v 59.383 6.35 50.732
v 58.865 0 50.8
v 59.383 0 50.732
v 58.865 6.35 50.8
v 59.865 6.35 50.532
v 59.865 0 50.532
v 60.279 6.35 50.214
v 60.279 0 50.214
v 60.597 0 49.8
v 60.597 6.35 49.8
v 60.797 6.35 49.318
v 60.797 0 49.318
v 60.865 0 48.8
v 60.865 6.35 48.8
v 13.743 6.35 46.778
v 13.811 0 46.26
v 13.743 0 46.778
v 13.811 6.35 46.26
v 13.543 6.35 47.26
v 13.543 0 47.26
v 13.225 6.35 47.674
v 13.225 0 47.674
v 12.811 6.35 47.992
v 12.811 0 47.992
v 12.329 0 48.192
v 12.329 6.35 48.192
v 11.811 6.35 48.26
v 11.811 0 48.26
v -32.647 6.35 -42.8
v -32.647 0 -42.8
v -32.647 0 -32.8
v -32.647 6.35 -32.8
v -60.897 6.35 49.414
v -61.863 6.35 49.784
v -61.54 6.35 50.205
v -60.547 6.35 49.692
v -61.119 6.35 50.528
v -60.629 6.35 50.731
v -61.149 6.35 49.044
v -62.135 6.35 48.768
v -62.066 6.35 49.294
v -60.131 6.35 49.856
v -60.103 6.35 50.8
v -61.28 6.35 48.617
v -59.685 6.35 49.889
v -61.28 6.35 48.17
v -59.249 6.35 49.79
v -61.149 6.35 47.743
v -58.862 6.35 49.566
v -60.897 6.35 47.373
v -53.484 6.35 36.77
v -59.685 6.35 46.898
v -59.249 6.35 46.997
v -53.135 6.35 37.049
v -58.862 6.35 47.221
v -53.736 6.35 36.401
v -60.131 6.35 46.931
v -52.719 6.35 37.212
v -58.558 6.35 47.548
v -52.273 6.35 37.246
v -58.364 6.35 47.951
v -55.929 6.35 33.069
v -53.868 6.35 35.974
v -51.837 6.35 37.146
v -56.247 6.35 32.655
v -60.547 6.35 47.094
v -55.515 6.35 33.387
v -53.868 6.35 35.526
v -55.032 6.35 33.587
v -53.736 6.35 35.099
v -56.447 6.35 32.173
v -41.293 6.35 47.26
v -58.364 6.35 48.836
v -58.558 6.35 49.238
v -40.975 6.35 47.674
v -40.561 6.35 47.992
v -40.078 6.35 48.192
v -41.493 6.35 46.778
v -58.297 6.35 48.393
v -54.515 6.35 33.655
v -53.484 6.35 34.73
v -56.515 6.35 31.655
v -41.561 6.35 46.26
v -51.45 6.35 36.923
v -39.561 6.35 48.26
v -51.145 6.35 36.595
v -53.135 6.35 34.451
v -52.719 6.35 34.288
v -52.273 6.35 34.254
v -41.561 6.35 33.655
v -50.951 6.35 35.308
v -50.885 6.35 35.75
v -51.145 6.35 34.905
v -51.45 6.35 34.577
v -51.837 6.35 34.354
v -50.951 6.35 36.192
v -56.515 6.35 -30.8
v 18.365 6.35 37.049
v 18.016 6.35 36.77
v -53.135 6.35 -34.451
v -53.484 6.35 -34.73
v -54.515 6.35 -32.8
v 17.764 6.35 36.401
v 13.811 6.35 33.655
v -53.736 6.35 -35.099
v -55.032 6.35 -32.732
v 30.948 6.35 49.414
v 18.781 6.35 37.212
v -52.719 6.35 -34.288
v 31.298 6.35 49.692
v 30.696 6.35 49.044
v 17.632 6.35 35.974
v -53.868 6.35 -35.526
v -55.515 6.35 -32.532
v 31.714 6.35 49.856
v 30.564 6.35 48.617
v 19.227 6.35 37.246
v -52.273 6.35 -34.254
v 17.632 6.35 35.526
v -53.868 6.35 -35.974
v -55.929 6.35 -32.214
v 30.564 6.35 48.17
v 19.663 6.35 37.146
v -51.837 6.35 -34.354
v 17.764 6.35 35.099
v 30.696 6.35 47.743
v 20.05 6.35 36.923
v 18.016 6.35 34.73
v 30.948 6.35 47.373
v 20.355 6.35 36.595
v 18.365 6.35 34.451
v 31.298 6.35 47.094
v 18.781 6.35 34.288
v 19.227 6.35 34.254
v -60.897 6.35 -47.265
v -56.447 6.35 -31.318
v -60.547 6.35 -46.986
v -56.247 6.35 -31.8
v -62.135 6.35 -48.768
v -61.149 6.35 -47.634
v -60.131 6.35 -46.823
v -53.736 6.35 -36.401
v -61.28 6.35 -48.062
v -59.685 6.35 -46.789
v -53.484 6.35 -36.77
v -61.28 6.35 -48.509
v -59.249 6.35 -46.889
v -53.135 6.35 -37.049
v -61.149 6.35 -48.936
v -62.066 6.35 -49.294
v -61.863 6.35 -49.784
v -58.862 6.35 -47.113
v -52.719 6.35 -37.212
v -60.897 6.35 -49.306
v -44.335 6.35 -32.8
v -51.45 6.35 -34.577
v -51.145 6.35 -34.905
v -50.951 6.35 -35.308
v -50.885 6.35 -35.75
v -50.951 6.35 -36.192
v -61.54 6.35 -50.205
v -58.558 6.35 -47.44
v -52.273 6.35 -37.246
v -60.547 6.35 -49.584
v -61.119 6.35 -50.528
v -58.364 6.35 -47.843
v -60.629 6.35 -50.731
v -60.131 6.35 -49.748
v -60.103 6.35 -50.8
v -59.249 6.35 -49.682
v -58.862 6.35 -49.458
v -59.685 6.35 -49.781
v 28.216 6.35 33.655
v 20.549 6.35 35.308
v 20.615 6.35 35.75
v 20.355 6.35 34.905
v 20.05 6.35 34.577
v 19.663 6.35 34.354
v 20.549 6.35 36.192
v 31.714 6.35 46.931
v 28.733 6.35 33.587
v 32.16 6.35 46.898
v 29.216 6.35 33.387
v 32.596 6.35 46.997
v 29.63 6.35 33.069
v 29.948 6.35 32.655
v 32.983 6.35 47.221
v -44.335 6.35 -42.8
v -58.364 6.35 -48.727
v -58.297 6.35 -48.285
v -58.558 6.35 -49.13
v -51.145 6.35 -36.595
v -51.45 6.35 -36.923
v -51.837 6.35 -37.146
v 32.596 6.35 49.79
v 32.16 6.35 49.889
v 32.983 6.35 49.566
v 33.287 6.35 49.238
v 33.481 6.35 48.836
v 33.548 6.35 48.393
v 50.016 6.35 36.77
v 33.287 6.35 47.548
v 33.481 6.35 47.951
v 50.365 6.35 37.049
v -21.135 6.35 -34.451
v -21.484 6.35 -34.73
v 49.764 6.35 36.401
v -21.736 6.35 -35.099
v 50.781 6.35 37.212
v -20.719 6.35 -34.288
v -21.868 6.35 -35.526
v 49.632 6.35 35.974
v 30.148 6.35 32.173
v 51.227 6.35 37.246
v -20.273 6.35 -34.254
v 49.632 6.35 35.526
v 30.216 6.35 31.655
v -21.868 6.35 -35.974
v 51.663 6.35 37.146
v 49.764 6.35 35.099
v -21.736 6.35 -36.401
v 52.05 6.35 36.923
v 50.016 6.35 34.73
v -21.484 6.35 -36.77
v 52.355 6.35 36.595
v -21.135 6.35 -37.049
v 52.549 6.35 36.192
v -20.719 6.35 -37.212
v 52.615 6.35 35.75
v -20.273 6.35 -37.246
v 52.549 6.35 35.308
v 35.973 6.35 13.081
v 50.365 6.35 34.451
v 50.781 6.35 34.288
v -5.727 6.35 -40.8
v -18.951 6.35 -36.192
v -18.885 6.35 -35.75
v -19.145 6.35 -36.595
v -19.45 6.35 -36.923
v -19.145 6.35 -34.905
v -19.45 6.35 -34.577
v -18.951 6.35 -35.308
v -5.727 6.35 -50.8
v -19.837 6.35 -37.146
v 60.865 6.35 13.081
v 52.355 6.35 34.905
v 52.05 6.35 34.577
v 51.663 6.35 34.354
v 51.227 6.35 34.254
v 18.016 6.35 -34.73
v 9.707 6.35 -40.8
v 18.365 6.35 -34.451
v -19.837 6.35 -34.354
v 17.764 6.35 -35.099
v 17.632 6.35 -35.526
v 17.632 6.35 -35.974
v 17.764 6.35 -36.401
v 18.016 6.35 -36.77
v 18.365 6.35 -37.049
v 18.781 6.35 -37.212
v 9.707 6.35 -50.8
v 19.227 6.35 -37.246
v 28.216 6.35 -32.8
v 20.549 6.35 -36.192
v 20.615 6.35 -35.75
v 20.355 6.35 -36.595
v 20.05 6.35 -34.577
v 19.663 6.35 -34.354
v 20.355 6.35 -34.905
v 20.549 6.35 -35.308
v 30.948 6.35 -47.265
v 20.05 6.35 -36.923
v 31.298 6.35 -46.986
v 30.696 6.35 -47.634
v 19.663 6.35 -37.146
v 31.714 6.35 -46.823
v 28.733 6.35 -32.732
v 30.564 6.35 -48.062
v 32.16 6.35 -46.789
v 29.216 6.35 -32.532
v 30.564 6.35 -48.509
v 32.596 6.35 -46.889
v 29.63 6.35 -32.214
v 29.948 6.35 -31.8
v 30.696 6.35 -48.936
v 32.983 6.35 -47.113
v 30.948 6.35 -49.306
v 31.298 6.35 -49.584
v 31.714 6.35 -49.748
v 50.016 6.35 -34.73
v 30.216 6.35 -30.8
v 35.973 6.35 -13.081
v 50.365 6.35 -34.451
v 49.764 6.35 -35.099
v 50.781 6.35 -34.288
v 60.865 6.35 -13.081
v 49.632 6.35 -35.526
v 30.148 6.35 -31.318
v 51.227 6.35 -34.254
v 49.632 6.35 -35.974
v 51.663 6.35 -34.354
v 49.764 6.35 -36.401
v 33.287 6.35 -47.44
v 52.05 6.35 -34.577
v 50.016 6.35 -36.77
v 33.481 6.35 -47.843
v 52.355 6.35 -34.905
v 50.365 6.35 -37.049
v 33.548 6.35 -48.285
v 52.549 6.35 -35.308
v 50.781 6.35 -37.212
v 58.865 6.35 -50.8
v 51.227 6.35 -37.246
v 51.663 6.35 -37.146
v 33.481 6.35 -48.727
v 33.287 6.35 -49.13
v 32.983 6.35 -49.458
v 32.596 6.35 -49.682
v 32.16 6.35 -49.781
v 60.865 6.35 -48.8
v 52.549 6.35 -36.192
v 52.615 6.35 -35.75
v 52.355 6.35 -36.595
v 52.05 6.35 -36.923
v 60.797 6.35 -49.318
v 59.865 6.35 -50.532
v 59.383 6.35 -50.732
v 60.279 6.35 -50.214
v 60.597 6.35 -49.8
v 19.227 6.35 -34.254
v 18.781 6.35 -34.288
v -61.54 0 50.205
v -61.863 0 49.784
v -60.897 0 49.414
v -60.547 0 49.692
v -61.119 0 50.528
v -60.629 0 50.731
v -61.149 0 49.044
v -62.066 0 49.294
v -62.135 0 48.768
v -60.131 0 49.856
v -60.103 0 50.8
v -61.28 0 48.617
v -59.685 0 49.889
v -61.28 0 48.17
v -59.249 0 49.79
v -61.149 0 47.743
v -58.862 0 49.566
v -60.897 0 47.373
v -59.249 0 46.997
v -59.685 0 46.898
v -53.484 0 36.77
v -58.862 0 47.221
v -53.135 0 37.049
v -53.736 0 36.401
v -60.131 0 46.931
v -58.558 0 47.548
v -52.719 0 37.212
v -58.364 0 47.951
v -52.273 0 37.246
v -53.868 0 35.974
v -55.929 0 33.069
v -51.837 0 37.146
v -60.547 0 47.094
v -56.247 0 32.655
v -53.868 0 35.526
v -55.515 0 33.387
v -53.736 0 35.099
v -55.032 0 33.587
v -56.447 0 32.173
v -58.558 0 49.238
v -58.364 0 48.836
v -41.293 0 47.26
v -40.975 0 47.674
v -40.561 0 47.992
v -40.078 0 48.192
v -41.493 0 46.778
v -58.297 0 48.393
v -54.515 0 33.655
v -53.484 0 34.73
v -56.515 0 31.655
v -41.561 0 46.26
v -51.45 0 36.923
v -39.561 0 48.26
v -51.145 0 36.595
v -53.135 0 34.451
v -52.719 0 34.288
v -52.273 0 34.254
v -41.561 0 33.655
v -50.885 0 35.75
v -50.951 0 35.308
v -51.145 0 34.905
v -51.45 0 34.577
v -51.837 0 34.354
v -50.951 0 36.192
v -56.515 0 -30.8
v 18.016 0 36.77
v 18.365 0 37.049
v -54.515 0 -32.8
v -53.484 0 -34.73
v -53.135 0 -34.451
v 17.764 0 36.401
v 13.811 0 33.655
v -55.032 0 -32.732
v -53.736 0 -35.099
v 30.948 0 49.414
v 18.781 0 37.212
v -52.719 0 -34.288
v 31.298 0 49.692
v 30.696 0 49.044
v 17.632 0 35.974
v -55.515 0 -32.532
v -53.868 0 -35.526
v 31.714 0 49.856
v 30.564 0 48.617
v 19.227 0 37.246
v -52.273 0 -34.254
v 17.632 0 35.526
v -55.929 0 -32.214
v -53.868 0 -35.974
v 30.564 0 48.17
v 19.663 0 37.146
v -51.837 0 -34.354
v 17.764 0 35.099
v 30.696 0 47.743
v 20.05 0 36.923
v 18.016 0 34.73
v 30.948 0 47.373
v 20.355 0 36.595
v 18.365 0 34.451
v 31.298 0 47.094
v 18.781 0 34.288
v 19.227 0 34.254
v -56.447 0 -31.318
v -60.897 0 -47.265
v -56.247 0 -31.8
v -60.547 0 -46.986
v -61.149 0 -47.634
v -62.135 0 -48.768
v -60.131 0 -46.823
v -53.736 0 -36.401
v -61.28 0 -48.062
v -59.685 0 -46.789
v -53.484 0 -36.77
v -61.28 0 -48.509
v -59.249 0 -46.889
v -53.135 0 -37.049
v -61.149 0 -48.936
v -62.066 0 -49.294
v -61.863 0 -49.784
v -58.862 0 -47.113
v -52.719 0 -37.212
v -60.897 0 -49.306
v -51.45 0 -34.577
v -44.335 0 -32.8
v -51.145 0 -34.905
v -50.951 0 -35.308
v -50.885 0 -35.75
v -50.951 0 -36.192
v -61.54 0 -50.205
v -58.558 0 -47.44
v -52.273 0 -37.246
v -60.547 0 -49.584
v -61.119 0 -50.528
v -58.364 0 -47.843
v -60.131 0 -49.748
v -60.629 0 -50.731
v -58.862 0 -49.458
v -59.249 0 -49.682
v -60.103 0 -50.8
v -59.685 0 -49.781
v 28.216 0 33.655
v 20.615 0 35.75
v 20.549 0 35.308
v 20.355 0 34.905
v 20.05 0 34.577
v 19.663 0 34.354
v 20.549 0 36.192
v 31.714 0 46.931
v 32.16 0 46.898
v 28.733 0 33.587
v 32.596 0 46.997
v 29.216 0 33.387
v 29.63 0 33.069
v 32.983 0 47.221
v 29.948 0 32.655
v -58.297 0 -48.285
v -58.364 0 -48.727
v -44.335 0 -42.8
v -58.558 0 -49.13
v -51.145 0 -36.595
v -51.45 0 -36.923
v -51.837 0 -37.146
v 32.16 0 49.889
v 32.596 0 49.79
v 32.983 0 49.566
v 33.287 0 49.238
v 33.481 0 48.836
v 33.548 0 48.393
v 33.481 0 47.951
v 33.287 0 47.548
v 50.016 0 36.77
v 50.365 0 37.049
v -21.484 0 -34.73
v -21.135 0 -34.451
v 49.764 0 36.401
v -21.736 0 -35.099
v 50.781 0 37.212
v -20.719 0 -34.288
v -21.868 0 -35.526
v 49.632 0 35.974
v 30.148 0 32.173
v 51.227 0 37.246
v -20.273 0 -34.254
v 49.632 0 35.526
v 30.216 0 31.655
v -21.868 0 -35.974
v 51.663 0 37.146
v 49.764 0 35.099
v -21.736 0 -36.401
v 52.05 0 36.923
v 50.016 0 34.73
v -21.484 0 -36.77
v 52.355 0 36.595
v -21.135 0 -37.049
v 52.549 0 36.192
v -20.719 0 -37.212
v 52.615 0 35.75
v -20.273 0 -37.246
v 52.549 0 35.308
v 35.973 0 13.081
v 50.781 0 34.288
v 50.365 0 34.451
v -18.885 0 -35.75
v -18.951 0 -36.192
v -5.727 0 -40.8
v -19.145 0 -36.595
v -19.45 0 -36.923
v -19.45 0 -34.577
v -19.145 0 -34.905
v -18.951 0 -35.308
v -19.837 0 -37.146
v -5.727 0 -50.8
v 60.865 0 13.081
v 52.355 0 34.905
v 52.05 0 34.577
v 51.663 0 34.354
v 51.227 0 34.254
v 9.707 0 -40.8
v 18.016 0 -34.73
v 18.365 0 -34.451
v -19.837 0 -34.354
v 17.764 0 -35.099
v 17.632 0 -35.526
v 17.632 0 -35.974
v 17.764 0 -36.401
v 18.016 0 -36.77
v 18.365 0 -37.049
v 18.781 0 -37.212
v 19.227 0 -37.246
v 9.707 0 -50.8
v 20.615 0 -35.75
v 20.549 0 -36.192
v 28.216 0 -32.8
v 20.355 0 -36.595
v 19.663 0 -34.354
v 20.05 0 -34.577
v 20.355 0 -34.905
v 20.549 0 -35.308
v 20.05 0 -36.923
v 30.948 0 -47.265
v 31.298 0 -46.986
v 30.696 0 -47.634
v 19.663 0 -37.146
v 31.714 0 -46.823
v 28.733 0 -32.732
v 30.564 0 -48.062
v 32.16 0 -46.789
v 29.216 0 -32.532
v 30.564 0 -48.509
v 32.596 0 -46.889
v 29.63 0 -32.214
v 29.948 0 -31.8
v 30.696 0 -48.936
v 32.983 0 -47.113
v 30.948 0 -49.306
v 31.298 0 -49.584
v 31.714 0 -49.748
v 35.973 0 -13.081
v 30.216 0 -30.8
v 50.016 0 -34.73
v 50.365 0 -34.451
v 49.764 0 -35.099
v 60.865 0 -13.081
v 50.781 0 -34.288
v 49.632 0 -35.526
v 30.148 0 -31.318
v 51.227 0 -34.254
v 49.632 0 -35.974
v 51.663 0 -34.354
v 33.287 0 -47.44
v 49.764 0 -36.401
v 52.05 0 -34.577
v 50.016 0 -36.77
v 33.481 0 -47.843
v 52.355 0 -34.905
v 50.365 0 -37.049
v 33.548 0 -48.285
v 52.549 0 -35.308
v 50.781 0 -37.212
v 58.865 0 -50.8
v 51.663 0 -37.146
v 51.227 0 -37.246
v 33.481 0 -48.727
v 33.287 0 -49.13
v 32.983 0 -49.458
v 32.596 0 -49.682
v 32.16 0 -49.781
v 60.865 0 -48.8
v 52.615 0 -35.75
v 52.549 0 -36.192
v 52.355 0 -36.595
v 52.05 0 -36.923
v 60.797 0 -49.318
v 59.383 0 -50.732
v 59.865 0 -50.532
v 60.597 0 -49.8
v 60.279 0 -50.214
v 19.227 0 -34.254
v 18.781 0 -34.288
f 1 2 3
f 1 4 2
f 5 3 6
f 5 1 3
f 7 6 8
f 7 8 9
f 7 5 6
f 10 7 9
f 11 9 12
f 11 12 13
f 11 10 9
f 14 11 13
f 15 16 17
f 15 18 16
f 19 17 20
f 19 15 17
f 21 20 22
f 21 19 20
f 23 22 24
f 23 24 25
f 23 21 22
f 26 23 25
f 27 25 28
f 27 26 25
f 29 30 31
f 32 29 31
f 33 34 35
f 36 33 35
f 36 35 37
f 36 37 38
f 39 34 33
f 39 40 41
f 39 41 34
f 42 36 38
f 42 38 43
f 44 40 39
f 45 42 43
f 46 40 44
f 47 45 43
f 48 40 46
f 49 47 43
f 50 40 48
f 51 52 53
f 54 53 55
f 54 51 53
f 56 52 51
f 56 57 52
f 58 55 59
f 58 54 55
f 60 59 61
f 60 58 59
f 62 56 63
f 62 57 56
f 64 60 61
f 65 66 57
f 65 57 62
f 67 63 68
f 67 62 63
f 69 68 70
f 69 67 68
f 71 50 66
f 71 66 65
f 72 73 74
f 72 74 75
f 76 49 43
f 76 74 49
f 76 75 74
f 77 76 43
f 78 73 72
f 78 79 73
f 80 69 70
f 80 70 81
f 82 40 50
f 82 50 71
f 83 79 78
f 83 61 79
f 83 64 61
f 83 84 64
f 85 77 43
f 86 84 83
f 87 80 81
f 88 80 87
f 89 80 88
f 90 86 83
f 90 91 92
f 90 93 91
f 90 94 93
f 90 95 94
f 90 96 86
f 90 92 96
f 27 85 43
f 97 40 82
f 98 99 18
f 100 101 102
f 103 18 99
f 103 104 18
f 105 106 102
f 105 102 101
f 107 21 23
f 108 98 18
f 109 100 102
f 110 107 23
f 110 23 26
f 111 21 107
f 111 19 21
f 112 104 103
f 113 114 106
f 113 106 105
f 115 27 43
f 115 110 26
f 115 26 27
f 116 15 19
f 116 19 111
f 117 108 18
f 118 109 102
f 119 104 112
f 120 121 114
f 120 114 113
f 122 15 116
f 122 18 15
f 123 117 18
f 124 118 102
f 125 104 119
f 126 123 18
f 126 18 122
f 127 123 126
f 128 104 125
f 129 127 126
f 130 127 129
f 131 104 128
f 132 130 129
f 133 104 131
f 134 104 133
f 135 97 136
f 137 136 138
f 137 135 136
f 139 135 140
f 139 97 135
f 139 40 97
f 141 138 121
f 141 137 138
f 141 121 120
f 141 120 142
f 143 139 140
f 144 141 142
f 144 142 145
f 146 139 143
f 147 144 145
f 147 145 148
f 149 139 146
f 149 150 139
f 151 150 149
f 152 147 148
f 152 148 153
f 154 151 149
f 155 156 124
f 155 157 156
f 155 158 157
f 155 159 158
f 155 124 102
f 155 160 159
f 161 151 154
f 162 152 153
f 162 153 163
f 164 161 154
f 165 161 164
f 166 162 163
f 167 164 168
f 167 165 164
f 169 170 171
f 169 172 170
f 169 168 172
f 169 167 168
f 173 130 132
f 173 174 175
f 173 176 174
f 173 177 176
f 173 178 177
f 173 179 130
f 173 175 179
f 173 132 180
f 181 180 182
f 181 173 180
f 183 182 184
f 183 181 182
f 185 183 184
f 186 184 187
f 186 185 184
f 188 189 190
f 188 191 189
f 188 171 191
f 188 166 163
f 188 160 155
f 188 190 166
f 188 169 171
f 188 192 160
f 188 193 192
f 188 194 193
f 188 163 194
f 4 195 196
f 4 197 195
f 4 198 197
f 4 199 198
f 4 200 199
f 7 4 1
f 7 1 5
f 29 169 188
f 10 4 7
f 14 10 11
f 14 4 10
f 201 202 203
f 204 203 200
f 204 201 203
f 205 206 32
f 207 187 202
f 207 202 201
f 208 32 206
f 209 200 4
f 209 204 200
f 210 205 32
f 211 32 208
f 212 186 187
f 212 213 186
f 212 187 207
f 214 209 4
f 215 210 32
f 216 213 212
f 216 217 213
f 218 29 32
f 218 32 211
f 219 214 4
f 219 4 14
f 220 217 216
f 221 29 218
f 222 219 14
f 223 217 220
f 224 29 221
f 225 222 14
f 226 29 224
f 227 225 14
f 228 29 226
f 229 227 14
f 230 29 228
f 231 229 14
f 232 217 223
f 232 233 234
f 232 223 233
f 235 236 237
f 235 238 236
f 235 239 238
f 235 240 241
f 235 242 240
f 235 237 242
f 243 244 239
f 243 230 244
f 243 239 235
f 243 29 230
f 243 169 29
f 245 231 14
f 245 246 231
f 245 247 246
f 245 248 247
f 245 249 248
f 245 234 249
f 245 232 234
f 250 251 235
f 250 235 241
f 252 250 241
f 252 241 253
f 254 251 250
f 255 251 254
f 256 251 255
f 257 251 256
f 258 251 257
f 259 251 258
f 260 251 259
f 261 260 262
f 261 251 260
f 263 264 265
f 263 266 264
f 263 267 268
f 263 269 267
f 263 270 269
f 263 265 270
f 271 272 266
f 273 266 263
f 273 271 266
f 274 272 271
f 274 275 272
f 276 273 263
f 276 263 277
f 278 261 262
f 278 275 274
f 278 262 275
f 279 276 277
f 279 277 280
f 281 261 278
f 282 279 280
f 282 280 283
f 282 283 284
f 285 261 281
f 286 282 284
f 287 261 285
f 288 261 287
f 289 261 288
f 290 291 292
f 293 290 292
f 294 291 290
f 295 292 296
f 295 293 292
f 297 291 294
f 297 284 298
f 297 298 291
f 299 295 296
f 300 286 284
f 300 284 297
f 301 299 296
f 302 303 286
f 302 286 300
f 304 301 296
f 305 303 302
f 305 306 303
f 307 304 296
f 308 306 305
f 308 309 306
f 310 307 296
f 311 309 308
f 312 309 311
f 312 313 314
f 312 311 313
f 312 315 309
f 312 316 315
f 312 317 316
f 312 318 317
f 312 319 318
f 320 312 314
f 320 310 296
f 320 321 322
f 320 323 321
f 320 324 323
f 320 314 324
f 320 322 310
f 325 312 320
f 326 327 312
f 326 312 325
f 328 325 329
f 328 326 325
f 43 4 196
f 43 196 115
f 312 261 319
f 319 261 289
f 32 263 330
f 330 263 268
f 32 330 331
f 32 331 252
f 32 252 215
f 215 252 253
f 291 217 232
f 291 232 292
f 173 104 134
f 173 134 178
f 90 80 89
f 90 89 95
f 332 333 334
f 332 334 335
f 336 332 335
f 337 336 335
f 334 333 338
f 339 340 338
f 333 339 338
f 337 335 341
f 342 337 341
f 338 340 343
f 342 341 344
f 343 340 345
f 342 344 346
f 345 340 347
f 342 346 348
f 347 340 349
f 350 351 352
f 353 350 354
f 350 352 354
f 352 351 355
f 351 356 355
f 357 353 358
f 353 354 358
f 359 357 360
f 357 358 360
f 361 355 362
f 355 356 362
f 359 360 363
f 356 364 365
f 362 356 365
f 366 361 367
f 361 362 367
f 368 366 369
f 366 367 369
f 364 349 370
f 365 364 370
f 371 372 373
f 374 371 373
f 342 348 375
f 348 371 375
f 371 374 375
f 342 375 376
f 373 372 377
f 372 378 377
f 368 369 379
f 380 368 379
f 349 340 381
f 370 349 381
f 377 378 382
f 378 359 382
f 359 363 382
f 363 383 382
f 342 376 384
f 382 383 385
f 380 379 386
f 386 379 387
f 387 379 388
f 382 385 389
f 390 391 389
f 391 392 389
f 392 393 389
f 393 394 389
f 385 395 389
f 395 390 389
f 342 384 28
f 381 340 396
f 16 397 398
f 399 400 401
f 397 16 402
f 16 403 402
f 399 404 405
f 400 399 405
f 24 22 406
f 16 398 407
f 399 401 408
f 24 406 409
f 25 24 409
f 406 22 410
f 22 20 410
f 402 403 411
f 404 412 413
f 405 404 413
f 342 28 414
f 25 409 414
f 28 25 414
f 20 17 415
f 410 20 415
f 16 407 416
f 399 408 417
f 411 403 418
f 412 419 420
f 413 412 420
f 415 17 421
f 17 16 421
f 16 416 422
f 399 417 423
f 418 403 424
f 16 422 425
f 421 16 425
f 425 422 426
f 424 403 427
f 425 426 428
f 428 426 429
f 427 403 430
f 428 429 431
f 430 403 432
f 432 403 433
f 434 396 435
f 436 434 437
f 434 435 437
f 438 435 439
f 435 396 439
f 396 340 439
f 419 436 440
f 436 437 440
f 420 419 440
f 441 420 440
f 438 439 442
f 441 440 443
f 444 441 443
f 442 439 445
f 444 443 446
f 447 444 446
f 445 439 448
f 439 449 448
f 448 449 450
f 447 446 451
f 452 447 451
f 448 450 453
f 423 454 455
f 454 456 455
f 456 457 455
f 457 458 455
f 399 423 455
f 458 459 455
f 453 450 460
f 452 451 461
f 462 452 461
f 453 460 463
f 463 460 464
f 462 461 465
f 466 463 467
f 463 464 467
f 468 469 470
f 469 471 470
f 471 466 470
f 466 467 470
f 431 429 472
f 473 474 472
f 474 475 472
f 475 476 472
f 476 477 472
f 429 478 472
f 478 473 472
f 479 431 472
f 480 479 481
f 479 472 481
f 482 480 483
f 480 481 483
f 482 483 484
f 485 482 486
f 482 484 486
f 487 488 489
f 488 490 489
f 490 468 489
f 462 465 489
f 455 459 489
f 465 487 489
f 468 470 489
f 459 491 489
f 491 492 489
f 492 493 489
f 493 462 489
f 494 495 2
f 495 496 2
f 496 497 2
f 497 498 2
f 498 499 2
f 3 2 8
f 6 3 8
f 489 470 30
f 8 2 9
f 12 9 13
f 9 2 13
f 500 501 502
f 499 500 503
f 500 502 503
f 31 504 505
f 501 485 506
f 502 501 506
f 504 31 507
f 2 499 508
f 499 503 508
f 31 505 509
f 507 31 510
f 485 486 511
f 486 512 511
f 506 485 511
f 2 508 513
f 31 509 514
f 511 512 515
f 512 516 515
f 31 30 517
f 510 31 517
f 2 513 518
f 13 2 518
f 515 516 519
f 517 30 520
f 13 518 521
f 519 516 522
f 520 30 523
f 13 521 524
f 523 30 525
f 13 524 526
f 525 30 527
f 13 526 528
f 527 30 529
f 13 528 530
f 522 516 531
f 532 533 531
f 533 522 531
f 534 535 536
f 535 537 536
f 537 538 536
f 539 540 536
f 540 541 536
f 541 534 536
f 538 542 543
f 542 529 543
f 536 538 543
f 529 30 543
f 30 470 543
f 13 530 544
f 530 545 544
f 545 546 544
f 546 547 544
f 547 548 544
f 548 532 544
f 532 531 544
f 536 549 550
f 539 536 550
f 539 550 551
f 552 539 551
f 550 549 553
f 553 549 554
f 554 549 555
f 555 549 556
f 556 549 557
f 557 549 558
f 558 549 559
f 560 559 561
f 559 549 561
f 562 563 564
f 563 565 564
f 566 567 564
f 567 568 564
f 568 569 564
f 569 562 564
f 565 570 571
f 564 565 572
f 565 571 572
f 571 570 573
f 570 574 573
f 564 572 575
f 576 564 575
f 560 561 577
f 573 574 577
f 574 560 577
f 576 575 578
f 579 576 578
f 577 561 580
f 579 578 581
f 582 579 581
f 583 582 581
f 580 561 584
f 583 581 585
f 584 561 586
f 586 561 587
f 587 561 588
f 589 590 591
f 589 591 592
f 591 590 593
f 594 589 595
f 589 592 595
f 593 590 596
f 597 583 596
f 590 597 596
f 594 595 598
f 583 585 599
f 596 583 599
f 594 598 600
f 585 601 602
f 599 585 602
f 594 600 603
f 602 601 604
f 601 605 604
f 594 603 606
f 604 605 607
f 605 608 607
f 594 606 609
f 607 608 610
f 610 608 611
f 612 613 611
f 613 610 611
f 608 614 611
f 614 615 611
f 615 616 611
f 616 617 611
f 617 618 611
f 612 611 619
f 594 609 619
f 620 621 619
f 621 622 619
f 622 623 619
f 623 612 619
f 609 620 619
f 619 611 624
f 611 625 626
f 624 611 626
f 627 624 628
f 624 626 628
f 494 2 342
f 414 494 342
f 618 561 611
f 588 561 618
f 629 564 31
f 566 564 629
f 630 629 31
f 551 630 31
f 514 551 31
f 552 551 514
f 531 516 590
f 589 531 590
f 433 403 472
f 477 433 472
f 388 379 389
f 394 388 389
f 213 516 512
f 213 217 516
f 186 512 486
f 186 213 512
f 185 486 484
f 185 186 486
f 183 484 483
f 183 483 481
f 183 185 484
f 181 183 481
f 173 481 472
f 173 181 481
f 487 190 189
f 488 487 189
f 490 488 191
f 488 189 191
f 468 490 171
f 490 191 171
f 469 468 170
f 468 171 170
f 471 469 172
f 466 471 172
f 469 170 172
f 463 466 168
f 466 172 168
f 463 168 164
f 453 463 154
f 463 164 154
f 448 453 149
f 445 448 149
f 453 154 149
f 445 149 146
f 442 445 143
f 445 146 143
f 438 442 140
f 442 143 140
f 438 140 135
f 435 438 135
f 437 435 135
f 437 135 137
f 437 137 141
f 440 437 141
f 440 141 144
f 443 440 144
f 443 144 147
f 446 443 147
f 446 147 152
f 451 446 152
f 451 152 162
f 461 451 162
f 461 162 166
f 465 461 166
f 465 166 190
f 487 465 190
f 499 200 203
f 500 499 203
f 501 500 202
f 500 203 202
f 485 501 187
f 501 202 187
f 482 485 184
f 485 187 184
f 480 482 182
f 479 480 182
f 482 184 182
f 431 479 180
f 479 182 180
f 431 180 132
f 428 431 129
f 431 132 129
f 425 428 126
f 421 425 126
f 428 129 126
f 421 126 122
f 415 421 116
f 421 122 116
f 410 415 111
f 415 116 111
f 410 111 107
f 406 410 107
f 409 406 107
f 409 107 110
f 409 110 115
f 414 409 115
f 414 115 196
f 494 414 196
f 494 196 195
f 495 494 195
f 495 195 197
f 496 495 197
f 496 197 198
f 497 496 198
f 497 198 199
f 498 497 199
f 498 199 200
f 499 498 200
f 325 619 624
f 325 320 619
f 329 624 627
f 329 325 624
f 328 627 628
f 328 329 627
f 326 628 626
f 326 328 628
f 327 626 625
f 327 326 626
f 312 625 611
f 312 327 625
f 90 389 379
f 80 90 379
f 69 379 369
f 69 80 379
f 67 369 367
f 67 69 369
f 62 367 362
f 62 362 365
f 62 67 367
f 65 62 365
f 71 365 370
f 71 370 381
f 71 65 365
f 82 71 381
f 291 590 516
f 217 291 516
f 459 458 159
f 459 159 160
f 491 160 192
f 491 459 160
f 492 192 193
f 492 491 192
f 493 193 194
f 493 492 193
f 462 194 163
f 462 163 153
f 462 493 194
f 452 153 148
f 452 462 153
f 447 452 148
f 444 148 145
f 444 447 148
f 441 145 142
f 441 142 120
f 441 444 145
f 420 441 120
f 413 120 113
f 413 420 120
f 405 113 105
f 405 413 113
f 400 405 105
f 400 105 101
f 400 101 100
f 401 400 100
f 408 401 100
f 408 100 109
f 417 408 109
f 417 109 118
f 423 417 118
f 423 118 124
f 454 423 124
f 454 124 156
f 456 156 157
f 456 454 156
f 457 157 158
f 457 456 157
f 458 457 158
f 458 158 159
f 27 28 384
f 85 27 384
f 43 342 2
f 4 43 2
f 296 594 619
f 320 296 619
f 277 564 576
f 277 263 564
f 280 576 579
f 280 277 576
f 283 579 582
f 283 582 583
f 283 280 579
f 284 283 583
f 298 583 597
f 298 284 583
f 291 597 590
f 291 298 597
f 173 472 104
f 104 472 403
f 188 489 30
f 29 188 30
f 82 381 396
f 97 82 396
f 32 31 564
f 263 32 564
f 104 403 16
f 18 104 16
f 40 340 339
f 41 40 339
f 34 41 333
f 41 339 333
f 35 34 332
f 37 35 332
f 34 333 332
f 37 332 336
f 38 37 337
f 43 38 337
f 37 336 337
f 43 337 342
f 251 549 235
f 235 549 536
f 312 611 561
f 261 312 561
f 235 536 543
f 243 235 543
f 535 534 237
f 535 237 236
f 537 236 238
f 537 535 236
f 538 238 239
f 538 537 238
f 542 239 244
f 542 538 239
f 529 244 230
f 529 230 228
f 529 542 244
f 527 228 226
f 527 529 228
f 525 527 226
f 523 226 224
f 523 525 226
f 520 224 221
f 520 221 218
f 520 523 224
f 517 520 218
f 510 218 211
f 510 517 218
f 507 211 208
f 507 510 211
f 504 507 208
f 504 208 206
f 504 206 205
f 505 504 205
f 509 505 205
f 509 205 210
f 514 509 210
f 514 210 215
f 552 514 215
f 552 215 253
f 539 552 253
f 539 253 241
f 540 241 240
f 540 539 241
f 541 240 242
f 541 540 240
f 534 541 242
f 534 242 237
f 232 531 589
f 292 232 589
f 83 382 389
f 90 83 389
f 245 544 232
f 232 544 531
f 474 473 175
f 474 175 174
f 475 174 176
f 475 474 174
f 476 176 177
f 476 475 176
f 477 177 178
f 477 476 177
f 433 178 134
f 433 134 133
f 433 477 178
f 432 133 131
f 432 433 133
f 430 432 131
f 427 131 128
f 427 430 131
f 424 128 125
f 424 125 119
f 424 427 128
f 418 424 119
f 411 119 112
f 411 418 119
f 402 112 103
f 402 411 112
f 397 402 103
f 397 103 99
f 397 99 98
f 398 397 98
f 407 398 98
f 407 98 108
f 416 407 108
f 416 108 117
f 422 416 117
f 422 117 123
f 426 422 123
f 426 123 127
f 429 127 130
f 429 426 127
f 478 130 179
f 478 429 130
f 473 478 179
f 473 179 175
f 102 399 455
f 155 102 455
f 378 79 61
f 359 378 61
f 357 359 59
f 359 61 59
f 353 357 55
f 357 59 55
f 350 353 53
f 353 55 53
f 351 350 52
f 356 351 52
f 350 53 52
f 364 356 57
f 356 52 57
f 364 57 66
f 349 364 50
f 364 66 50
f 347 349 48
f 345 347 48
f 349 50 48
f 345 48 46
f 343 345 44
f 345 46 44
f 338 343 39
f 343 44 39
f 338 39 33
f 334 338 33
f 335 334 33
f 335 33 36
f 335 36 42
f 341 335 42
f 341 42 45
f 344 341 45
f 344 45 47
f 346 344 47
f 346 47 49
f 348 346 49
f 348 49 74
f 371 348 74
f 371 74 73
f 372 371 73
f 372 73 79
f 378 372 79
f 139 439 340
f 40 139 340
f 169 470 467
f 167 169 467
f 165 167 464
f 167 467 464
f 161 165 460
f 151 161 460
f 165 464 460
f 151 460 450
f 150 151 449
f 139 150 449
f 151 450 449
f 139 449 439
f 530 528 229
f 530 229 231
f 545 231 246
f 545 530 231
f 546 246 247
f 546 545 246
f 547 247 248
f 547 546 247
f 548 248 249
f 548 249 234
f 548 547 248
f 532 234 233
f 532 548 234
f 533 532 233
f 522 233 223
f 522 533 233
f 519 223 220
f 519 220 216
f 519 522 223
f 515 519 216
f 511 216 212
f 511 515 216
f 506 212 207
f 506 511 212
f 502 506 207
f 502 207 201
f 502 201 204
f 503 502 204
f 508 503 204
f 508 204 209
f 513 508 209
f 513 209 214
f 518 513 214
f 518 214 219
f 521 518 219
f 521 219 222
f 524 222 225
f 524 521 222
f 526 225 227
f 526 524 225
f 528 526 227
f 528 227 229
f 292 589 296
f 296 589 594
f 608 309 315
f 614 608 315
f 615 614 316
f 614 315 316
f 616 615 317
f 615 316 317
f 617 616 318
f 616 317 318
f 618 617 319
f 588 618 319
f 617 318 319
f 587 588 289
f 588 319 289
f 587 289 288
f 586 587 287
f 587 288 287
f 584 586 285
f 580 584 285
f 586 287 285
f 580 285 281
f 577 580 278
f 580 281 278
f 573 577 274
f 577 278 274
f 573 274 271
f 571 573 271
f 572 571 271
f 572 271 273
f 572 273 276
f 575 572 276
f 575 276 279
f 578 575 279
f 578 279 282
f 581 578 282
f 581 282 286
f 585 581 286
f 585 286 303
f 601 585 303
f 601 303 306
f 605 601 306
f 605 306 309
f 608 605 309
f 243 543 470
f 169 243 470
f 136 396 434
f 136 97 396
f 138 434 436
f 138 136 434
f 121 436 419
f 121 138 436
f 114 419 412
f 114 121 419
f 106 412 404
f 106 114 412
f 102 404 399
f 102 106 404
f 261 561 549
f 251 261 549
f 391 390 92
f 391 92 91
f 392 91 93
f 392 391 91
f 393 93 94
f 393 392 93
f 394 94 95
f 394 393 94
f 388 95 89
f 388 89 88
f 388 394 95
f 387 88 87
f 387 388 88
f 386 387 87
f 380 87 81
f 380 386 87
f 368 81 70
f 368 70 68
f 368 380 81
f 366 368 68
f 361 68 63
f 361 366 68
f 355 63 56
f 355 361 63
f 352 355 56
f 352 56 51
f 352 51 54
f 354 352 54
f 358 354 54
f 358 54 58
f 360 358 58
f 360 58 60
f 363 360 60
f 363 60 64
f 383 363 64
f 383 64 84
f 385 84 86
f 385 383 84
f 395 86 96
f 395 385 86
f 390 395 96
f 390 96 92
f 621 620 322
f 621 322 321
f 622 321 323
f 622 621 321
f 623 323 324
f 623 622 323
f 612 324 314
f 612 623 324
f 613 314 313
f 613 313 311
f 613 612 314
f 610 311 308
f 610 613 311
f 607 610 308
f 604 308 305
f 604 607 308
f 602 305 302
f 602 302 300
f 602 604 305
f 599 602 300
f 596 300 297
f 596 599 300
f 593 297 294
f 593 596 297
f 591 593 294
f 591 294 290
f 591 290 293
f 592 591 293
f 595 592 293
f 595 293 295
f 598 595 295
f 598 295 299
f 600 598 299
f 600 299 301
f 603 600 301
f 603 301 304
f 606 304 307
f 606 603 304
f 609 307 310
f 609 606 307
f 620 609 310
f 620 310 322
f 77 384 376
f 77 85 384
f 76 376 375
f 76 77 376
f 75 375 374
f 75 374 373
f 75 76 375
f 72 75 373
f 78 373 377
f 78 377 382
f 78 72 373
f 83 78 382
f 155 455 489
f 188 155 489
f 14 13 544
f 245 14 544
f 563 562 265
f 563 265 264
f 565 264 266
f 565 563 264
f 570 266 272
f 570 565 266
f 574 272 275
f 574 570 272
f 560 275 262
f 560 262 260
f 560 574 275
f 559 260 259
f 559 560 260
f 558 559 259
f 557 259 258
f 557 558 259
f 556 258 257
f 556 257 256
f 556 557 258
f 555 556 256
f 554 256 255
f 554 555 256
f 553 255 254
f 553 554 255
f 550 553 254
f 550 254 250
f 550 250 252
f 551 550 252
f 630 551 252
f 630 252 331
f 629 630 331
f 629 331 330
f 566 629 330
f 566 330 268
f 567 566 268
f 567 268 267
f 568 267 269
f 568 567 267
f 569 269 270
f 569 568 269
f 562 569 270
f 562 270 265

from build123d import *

# Parameters (mm, degrees)
SKETCH1_R           = 1.5
BOSS_EXTRUDE1_DEPTH = 6.35
FILLET1_R           = 2
SKETCH2_R           = 1.5
CUT_EXTRUDE1_DEPTH  = 7.35


with BuildPart() as part:
    # Sketch1 → Boss-Extrude1 (new body)
    with BuildSketch(Plane(origin=(0, 0, 0), x_dir=(1, 0, 0), z_dir=(0, 1, 0))):
        Polygon((-32.64725, 32.8), (30.21585, 32.8), (30.21585, -33.654999237), (13.81125, -33.654999237), (13.81125, -44), (34.38525, -44), (34.38525, 44), (9.70725, 44), (9.70725, 40.8), (-5.72675, 40.8), (-5.72675, 44), (-62.13475, 44), (-62.13475, -44), (-41.56075, -44), (-41.56075, -33.654999237), (-56.51475, -33.654999237), (-56.51475, 32.8), (-44.33475, 32.8), (-44.33475, 42.8), (-32.64725, 42.8), align=None)
        with Locations((-52.38475, -35.75)):
            Circle(SKETCH1_R, mode=Mode.SUBTRACT)
        with Locations((19.11525, -35.75)):
            Circle(SKETCH1_R, mode=Mode.SUBTRACT)
        with Locations((-52.38475, 35.75)):
            Circle(SKETCH1_R, mode=Mode.SUBTRACT)
        with Locations((-20.38475, 35.75)):
            Circle(SKETCH1_R, mode=Mode.SUBTRACT)
        with Locations((19.11525, 35.75)):
            Circle(SKETCH1_R, mode=Mode.SUBTRACT)
        with BuildLine():
            Line((34.38525, -44), (13.81125, -44))
            Line((13.81125, -44), (13.81125, -48.259999237))
            Line((13.81125, -48.259999237), (-41.56075, -48.259999237))
            Line((-41.56075, -48.259999237), (-41.56075, -44))
            Line((-41.56075, -44), (-62.13475, -44))
            Line((-62.13475, -44), (-62.13475, -48.768))
            ThreePointArc((-62.13475, -48.768), (-61.539590979, -50.204840979), (-60.10275, -50.8))
            Line((-60.10275, -50.8), (32.35325, -50.8))
            ThreePointArc((32.35325, -50.8), (33.790090979, -50.204840979), (34.38525, -48.768))
            Line((34.38525, -48.768), (34.38525, -44))
        make_face()
        with BuildLine():
            Line((-62.13475, 48.768), (-62.13475, 44))
            Line((-62.13475, 44), (-5.72675, 44))
            Line((-5.72675, 44), (-5.72675, 50.8))
            Line((-5.72675, 50.8), (-60.10275, 50.8))
            ThreePointArc((-60.10275, 50.8), (-61.539590979, 50.204840979), (-62.13475, 48.768))
        make_face()
        with BuildLine():
            Line((9.70725, 44), (34.38525, 44))
            Line((34.38525, 44), (34.38525, 48.768))
            ThreePointArc((34.38525, 48.768), (33.790090979, 50.204840979), (32.35325, 50.8))
            Line((32.35325, 50.8), (9.70725, 50.8))
            Line((9.70725, 50.8), (9.70725, 44))
        make_face()
        with BuildLine():
            Line((34.38525, 48.768), (34.38525, 44))
            Line((34.38525, 44), (60.86525, 44))
            Line((60.86525, 44), (60.86525, 50.8))
            Line((60.86525, 50.8), (32.35325, 50.8))
            ThreePointArc((32.35325, 50.8), (33.790090979, 50.204840979), (34.38525, 48.768))
        make_face()
        Polygon((34.38525, 44), (34.38525, -44), (60.86525, -44), (60.86525, -13.081), (35.97275, -13.081), (35.97275, 13.081), (60.86525, 13.081), (60.86525, 44), align=None)
        with Locations((51.11525, -35.75)):
            Circle(SKETCH1_R, mode=Mode.SUBTRACT)
        with Locations((51.11525, 35.75)):
            Circle(SKETCH1_R, mode=Mode.SUBTRACT)
        with BuildLine():
            Line((60.86525, -44), (34.38525, -44))
            Line((34.38525, -44), (34.38525, -48.768))
            ThreePointArc((34.38525, -48.768), (33.790090979, -50.204840979), (32.35325, -50.8))
            Line((32.35325, -50.8), (60.86525, -50.8))
            Line((60.86525, -50.8), (60.86525, -44))
        make_face()
    extrude(amount=BOSS_EXTRUDE1_DEPTH)

    # Fillet1
    fillet1_edges = [part.edges().sort_by_distance(p)[0] for p in [
        (60.86525, 3.175, -50.8),
        (60.86525, 3.175, 50.8),
        (30.21585, 3.175, 33.654999237),
        (30.21585, 3.175, -32.8),
        (-56.51475, 3.175, -32.8),
        (-56.51475, 3.175, 33.654999237),
        (-41.56075, 3.175, 48.259999237),
        (13.81125, 3.175, 48.259999237),
    ]]
    fillet(fillet1_edges, radius=FILLET1_R)

    # Sketch2 → Cut-Extrude1 (cut, through all)
    with BuildSketch(Plane(origin=(0, 6.35, 0), x_dir=(1, 0, 0), z_dir=(0, 1, 0))):
        with Locations((-59.79712037, -48.3933723)):
            Circle(SKETCH2_R)
        with Locations((32.04762038, -48.3933723)):
            Circle(SKETCH2_R)
        with Locations((32.04762038, 48.28530217)):
            Circle(SKETCH2_R)
        with Locations((-59.79712037, 48.28530217)):
            Circle(SKETCH2_R)
    extrude(amount=-CUT_EXTRUDE1_DEPTH, mode=Mode.SUBTRACT)


solid = part.part
